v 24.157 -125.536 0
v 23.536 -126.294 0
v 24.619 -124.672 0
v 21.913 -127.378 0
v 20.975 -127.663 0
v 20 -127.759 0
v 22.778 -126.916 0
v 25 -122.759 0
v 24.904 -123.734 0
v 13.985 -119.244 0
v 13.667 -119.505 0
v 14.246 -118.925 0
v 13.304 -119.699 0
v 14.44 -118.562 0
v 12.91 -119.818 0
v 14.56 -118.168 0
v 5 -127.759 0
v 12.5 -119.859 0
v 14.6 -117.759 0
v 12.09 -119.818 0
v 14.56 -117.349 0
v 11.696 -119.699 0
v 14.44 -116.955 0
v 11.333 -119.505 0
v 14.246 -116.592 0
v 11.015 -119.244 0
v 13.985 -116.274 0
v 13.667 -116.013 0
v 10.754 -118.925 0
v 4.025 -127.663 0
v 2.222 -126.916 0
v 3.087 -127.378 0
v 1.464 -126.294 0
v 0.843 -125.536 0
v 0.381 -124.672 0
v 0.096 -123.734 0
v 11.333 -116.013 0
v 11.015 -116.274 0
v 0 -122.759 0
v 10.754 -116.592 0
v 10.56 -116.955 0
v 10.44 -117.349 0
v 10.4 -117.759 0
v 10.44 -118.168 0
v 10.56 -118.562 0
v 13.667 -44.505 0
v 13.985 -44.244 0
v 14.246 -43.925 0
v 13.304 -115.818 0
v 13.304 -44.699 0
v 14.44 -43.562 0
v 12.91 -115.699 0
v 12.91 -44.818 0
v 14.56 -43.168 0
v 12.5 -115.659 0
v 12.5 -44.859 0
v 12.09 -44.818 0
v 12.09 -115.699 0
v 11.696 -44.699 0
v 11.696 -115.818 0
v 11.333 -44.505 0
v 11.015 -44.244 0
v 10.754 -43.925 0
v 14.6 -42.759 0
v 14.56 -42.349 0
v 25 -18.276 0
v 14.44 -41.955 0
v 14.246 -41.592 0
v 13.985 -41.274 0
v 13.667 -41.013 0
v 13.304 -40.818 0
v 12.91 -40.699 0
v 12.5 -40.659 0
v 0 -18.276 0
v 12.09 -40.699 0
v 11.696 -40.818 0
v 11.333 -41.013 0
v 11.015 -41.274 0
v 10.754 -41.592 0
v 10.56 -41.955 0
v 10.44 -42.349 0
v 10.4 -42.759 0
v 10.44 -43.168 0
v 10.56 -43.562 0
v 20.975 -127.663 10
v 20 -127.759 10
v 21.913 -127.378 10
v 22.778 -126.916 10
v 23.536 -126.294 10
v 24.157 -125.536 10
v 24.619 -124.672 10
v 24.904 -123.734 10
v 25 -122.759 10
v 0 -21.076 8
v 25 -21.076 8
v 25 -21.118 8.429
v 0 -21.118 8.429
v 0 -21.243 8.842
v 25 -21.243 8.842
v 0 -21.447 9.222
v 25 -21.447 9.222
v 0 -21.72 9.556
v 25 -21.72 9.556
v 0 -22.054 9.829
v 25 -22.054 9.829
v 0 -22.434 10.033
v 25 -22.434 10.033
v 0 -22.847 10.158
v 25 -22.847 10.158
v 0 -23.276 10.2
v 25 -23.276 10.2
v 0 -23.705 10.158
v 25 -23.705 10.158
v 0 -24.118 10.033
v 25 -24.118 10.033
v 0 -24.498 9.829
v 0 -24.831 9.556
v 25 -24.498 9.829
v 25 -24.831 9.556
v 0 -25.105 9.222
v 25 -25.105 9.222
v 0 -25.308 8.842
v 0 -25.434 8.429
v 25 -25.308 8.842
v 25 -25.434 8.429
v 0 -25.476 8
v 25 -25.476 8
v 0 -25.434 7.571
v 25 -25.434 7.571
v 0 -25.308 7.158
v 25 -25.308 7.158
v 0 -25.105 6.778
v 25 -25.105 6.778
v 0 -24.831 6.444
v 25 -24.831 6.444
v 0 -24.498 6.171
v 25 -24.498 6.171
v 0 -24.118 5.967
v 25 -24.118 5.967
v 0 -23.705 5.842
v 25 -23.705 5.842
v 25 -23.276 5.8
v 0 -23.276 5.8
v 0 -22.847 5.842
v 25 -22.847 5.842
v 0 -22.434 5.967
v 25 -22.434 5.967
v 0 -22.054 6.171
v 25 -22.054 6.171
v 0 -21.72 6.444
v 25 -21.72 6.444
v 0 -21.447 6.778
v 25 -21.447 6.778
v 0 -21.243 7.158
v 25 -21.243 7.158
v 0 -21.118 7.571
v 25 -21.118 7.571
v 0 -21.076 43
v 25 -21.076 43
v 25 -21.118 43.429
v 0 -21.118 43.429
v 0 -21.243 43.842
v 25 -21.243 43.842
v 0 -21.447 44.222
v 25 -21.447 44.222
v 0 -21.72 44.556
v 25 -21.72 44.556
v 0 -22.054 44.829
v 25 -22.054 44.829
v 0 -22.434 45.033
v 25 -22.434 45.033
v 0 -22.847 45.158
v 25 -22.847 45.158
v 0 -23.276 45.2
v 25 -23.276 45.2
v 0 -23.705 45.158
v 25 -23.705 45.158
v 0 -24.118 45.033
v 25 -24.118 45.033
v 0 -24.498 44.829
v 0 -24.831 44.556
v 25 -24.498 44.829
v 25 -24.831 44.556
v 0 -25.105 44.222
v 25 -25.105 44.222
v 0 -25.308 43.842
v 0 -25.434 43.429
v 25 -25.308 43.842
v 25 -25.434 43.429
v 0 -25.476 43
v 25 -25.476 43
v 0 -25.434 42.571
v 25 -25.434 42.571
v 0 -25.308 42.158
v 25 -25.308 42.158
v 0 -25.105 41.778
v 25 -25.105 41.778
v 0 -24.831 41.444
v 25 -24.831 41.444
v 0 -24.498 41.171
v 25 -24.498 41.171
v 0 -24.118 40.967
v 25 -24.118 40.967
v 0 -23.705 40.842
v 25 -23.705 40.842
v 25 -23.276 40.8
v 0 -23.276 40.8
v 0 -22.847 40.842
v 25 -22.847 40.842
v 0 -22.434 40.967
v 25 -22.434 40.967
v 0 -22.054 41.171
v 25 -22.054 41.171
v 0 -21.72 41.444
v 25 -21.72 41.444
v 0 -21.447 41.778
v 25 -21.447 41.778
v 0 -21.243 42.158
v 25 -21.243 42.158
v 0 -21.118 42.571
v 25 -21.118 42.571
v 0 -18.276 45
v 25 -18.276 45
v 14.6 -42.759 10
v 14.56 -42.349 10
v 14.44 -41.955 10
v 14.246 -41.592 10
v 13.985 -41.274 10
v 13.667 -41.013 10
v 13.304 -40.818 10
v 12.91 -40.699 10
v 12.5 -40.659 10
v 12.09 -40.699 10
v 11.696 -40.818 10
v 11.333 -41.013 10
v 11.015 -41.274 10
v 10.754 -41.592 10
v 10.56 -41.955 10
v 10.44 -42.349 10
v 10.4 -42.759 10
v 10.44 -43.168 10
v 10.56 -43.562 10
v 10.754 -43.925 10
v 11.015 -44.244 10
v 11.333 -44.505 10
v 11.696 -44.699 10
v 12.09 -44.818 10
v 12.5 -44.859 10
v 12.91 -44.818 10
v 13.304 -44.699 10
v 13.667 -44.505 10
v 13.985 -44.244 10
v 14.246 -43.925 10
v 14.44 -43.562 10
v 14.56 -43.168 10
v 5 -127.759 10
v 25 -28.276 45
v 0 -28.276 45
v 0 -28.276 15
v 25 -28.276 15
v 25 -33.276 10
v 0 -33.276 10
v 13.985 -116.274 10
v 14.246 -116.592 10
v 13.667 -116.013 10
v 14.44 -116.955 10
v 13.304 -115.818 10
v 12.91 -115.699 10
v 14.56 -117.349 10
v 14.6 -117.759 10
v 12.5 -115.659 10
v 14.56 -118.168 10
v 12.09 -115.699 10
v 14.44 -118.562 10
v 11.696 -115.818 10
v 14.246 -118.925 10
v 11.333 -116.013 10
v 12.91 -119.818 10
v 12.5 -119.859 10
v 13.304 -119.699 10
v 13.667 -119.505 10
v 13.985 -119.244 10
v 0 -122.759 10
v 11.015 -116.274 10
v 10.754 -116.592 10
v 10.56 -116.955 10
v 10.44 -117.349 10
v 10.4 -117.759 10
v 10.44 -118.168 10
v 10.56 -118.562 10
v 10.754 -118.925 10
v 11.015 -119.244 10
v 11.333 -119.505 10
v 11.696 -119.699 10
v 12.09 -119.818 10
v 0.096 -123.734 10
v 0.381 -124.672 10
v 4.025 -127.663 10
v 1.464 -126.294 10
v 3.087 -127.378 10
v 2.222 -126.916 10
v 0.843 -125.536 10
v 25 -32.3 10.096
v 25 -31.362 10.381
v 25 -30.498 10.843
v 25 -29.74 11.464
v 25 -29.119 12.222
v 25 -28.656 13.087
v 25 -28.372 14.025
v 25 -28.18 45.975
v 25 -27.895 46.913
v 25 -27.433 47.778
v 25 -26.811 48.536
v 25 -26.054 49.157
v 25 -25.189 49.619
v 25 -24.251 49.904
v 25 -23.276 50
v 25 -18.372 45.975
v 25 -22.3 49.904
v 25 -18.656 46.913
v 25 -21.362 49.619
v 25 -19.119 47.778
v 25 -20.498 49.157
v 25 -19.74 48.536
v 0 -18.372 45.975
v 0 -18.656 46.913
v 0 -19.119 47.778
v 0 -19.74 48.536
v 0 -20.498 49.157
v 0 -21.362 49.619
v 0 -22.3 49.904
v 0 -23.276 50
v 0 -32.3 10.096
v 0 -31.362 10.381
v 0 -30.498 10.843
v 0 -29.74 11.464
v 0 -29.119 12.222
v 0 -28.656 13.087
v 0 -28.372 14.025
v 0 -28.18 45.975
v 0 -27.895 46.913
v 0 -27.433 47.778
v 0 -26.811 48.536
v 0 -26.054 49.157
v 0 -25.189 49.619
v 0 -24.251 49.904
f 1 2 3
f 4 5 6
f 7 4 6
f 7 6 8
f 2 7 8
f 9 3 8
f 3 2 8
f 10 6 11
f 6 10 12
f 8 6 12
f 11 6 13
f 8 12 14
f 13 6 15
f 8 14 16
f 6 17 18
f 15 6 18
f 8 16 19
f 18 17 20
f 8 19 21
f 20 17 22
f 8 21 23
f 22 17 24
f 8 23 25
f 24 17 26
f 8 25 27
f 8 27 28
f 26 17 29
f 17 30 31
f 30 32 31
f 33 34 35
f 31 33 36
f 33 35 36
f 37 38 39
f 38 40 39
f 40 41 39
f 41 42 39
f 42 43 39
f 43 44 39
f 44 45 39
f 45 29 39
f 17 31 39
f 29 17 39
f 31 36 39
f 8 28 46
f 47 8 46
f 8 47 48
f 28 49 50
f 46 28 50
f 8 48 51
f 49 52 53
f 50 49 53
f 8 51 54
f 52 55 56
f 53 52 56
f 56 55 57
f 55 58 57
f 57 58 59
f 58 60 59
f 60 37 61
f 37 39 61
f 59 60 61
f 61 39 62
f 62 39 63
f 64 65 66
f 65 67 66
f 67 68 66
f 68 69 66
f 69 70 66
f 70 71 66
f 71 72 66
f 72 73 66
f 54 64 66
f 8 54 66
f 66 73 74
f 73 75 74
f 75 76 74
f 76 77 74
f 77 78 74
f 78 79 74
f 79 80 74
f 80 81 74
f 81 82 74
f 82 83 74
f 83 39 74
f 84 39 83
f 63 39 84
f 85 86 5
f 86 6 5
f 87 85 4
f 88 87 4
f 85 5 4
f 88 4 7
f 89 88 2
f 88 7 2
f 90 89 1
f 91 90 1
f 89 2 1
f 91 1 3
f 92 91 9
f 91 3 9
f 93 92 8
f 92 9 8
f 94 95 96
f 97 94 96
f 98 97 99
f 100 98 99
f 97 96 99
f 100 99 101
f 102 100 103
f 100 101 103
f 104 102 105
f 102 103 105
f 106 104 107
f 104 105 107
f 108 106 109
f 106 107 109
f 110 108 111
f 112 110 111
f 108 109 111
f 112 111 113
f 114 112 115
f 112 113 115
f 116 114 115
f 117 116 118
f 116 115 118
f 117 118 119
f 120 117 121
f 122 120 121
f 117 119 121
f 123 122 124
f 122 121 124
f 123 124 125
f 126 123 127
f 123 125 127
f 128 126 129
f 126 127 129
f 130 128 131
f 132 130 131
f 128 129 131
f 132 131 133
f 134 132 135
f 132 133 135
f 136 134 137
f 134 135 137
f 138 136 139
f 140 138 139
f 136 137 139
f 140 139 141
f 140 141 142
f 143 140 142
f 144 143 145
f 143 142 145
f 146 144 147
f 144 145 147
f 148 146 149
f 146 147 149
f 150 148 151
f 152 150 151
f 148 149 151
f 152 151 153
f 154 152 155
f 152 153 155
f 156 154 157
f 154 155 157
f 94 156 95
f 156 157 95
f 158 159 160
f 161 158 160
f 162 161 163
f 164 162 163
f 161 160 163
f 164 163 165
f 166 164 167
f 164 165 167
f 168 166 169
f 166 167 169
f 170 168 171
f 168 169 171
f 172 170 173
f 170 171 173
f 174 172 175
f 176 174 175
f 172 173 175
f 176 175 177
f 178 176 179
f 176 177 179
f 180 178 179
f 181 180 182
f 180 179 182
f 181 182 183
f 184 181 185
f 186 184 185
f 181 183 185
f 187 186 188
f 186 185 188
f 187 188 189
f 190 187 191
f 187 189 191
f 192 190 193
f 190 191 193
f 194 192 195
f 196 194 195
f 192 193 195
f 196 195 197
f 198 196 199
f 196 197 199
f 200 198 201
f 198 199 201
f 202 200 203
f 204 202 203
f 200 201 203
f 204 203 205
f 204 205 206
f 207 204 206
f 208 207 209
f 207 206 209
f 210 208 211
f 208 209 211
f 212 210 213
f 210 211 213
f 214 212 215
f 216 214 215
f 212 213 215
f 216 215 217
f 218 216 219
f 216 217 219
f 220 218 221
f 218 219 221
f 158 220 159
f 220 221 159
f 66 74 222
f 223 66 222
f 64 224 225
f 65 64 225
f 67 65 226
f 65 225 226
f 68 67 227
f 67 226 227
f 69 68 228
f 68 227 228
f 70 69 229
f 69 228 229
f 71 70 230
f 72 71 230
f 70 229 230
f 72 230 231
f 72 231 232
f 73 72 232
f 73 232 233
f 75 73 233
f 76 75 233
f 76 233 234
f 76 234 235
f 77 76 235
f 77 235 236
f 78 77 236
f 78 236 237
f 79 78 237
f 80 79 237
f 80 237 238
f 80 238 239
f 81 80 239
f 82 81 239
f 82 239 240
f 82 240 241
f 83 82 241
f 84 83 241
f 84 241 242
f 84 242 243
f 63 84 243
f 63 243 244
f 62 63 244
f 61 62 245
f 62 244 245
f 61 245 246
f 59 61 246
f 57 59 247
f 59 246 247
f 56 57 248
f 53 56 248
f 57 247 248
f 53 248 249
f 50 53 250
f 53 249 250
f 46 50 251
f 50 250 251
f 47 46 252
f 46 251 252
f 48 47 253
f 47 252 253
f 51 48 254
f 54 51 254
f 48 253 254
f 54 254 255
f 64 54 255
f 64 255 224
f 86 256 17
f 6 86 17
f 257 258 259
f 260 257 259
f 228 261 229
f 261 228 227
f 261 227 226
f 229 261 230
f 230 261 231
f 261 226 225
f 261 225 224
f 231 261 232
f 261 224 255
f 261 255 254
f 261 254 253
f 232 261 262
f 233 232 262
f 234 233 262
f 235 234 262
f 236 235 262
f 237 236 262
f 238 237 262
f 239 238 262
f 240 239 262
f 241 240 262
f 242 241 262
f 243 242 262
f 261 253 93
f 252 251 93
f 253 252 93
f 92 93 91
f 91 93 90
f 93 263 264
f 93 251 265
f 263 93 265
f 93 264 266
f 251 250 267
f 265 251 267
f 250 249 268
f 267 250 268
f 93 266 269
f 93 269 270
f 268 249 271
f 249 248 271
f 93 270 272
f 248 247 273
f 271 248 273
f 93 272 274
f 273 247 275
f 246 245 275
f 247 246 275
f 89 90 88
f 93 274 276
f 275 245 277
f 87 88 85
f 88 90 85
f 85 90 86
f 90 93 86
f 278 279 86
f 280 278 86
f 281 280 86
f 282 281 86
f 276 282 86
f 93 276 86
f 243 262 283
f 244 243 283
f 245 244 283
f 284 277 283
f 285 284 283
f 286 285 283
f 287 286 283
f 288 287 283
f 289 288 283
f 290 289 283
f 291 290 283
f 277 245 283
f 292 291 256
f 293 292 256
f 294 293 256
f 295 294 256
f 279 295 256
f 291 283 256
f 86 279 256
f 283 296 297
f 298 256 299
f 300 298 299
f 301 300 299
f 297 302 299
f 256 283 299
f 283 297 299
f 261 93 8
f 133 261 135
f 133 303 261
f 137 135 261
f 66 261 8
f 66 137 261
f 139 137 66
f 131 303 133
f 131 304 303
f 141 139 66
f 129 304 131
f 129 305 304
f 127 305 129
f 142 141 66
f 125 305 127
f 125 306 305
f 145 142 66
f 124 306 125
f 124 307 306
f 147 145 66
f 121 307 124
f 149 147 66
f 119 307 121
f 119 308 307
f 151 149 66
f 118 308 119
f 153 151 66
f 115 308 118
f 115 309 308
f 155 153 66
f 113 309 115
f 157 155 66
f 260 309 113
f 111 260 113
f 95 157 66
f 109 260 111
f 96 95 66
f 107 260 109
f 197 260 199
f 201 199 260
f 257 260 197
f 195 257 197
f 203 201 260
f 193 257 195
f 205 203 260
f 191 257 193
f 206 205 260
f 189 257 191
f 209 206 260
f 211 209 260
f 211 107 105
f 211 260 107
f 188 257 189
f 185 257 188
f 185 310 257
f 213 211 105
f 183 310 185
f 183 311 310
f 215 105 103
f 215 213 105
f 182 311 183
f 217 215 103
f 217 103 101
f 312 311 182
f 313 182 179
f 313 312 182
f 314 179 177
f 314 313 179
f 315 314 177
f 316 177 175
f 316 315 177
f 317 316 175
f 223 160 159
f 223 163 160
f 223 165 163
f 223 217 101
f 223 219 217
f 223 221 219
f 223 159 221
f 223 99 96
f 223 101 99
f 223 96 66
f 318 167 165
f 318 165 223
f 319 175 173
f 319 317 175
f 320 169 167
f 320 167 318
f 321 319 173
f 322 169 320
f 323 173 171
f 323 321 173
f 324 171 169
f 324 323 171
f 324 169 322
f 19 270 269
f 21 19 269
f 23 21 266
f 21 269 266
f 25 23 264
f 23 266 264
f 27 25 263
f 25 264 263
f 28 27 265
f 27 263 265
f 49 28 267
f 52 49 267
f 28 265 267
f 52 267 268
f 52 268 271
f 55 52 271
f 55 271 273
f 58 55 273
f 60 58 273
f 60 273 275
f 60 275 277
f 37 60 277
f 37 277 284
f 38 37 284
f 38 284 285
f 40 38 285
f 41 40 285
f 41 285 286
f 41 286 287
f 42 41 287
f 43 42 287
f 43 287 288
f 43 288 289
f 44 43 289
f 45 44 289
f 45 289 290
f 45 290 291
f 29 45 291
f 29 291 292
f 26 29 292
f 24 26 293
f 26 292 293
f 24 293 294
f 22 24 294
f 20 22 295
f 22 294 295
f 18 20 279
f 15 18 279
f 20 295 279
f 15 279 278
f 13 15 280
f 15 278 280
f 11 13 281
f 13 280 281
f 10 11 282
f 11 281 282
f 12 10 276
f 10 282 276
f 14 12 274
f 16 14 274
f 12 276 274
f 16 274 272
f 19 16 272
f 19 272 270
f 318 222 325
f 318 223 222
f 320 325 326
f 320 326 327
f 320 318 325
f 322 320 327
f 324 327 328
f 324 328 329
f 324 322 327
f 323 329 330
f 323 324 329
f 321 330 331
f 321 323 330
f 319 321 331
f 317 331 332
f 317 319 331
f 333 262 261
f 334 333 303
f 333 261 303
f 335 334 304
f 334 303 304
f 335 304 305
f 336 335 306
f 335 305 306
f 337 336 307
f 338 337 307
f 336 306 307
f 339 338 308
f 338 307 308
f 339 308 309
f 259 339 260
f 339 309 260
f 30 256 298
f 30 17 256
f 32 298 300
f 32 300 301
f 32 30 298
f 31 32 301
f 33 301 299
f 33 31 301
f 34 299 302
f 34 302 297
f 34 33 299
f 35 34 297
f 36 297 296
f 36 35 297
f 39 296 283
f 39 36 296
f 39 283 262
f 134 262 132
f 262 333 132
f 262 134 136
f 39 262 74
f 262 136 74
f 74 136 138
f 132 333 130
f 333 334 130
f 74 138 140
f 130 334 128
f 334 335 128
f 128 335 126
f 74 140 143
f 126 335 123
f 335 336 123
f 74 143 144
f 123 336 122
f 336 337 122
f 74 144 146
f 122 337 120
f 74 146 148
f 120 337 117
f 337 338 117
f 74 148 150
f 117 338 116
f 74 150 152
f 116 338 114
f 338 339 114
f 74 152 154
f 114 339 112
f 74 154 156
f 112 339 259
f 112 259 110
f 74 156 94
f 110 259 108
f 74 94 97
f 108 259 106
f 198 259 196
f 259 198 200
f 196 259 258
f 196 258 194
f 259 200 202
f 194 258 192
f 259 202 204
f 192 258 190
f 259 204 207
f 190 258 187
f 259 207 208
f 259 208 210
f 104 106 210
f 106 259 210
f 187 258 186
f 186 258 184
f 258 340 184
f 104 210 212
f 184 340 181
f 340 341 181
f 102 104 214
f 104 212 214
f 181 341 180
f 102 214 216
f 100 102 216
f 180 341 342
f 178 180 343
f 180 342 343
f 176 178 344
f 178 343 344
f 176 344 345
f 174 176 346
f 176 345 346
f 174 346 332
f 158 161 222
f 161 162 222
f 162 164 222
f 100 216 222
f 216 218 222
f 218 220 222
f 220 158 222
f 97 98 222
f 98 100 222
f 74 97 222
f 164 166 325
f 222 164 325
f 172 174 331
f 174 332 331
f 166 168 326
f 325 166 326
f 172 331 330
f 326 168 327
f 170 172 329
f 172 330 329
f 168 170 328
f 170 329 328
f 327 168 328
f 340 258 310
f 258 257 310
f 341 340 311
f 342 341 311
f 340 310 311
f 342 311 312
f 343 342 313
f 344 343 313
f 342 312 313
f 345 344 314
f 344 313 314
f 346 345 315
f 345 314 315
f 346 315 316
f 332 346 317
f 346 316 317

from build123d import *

# Parameters (mm, degrees)
F1_DEPTH = 25
F3_R     = 2.1
F4_DEPTH = 25
F6_R     = 2.2
F7_DEPTH = 25
F8_R     = 4.99999


# Not quite as in the source:
# - a fillet or chamfer is up to 0.001 mm smaller than in the source, because OpenCascade refuses the exact size


with BuildPart() as f1:
    # F0 (on Right) → F1 (new body)
    with BuildSketch(Plane.YZ):
        Polygon((-127.7586124506, 10), (-127.7586124506, 0), (-18.2758603601, 0), (-18.2758603601, 50), (-28.2758603601, 50), (-28.2758603601, 10), align=None)
    extrude(amount=F1_DEPTH)

    # F3 (on face) → F4 (cut)
    with BuildSketch(Plane.XY.offset(10)):
        with Locations((12.5, -117.7586124506)):
            Circle(F3_R)
        with Locations((12.5, -42.7586124506)):
            Circle(F3_R)
    extrude(amount=-F4_DEPTH, mode=Mode.SUBTRACT)

    # F6 (on face) → F7 (cut)
    with BuildSketch(Plane.YZ.offset(25)):
        with Locations((-23.2758603601, 43)):
            Circle(F6_R)
        with Locations((-23.2758603601, 8)):
            Circle(F6_R)
    extrude(amount=-F7_DEPTH, mode=Mode.SUBTRACT)

    # F8 (radius 5 in the source; OpenCascade refuses exactly that, so slightly less here)
    f8_edges = [f1.edges().sort_by_distance(p)[0] for p in [
        (12.5, -28.27586, 10),
        (12.5, -18.27586, 50),
        (12.5, -28.27586, 50),
        (25, -127.758612, 5),
        (0, -127.758612, 5),
    ]]
    fillet(f8_edges, radius=F8_R)


solid = f1.part
